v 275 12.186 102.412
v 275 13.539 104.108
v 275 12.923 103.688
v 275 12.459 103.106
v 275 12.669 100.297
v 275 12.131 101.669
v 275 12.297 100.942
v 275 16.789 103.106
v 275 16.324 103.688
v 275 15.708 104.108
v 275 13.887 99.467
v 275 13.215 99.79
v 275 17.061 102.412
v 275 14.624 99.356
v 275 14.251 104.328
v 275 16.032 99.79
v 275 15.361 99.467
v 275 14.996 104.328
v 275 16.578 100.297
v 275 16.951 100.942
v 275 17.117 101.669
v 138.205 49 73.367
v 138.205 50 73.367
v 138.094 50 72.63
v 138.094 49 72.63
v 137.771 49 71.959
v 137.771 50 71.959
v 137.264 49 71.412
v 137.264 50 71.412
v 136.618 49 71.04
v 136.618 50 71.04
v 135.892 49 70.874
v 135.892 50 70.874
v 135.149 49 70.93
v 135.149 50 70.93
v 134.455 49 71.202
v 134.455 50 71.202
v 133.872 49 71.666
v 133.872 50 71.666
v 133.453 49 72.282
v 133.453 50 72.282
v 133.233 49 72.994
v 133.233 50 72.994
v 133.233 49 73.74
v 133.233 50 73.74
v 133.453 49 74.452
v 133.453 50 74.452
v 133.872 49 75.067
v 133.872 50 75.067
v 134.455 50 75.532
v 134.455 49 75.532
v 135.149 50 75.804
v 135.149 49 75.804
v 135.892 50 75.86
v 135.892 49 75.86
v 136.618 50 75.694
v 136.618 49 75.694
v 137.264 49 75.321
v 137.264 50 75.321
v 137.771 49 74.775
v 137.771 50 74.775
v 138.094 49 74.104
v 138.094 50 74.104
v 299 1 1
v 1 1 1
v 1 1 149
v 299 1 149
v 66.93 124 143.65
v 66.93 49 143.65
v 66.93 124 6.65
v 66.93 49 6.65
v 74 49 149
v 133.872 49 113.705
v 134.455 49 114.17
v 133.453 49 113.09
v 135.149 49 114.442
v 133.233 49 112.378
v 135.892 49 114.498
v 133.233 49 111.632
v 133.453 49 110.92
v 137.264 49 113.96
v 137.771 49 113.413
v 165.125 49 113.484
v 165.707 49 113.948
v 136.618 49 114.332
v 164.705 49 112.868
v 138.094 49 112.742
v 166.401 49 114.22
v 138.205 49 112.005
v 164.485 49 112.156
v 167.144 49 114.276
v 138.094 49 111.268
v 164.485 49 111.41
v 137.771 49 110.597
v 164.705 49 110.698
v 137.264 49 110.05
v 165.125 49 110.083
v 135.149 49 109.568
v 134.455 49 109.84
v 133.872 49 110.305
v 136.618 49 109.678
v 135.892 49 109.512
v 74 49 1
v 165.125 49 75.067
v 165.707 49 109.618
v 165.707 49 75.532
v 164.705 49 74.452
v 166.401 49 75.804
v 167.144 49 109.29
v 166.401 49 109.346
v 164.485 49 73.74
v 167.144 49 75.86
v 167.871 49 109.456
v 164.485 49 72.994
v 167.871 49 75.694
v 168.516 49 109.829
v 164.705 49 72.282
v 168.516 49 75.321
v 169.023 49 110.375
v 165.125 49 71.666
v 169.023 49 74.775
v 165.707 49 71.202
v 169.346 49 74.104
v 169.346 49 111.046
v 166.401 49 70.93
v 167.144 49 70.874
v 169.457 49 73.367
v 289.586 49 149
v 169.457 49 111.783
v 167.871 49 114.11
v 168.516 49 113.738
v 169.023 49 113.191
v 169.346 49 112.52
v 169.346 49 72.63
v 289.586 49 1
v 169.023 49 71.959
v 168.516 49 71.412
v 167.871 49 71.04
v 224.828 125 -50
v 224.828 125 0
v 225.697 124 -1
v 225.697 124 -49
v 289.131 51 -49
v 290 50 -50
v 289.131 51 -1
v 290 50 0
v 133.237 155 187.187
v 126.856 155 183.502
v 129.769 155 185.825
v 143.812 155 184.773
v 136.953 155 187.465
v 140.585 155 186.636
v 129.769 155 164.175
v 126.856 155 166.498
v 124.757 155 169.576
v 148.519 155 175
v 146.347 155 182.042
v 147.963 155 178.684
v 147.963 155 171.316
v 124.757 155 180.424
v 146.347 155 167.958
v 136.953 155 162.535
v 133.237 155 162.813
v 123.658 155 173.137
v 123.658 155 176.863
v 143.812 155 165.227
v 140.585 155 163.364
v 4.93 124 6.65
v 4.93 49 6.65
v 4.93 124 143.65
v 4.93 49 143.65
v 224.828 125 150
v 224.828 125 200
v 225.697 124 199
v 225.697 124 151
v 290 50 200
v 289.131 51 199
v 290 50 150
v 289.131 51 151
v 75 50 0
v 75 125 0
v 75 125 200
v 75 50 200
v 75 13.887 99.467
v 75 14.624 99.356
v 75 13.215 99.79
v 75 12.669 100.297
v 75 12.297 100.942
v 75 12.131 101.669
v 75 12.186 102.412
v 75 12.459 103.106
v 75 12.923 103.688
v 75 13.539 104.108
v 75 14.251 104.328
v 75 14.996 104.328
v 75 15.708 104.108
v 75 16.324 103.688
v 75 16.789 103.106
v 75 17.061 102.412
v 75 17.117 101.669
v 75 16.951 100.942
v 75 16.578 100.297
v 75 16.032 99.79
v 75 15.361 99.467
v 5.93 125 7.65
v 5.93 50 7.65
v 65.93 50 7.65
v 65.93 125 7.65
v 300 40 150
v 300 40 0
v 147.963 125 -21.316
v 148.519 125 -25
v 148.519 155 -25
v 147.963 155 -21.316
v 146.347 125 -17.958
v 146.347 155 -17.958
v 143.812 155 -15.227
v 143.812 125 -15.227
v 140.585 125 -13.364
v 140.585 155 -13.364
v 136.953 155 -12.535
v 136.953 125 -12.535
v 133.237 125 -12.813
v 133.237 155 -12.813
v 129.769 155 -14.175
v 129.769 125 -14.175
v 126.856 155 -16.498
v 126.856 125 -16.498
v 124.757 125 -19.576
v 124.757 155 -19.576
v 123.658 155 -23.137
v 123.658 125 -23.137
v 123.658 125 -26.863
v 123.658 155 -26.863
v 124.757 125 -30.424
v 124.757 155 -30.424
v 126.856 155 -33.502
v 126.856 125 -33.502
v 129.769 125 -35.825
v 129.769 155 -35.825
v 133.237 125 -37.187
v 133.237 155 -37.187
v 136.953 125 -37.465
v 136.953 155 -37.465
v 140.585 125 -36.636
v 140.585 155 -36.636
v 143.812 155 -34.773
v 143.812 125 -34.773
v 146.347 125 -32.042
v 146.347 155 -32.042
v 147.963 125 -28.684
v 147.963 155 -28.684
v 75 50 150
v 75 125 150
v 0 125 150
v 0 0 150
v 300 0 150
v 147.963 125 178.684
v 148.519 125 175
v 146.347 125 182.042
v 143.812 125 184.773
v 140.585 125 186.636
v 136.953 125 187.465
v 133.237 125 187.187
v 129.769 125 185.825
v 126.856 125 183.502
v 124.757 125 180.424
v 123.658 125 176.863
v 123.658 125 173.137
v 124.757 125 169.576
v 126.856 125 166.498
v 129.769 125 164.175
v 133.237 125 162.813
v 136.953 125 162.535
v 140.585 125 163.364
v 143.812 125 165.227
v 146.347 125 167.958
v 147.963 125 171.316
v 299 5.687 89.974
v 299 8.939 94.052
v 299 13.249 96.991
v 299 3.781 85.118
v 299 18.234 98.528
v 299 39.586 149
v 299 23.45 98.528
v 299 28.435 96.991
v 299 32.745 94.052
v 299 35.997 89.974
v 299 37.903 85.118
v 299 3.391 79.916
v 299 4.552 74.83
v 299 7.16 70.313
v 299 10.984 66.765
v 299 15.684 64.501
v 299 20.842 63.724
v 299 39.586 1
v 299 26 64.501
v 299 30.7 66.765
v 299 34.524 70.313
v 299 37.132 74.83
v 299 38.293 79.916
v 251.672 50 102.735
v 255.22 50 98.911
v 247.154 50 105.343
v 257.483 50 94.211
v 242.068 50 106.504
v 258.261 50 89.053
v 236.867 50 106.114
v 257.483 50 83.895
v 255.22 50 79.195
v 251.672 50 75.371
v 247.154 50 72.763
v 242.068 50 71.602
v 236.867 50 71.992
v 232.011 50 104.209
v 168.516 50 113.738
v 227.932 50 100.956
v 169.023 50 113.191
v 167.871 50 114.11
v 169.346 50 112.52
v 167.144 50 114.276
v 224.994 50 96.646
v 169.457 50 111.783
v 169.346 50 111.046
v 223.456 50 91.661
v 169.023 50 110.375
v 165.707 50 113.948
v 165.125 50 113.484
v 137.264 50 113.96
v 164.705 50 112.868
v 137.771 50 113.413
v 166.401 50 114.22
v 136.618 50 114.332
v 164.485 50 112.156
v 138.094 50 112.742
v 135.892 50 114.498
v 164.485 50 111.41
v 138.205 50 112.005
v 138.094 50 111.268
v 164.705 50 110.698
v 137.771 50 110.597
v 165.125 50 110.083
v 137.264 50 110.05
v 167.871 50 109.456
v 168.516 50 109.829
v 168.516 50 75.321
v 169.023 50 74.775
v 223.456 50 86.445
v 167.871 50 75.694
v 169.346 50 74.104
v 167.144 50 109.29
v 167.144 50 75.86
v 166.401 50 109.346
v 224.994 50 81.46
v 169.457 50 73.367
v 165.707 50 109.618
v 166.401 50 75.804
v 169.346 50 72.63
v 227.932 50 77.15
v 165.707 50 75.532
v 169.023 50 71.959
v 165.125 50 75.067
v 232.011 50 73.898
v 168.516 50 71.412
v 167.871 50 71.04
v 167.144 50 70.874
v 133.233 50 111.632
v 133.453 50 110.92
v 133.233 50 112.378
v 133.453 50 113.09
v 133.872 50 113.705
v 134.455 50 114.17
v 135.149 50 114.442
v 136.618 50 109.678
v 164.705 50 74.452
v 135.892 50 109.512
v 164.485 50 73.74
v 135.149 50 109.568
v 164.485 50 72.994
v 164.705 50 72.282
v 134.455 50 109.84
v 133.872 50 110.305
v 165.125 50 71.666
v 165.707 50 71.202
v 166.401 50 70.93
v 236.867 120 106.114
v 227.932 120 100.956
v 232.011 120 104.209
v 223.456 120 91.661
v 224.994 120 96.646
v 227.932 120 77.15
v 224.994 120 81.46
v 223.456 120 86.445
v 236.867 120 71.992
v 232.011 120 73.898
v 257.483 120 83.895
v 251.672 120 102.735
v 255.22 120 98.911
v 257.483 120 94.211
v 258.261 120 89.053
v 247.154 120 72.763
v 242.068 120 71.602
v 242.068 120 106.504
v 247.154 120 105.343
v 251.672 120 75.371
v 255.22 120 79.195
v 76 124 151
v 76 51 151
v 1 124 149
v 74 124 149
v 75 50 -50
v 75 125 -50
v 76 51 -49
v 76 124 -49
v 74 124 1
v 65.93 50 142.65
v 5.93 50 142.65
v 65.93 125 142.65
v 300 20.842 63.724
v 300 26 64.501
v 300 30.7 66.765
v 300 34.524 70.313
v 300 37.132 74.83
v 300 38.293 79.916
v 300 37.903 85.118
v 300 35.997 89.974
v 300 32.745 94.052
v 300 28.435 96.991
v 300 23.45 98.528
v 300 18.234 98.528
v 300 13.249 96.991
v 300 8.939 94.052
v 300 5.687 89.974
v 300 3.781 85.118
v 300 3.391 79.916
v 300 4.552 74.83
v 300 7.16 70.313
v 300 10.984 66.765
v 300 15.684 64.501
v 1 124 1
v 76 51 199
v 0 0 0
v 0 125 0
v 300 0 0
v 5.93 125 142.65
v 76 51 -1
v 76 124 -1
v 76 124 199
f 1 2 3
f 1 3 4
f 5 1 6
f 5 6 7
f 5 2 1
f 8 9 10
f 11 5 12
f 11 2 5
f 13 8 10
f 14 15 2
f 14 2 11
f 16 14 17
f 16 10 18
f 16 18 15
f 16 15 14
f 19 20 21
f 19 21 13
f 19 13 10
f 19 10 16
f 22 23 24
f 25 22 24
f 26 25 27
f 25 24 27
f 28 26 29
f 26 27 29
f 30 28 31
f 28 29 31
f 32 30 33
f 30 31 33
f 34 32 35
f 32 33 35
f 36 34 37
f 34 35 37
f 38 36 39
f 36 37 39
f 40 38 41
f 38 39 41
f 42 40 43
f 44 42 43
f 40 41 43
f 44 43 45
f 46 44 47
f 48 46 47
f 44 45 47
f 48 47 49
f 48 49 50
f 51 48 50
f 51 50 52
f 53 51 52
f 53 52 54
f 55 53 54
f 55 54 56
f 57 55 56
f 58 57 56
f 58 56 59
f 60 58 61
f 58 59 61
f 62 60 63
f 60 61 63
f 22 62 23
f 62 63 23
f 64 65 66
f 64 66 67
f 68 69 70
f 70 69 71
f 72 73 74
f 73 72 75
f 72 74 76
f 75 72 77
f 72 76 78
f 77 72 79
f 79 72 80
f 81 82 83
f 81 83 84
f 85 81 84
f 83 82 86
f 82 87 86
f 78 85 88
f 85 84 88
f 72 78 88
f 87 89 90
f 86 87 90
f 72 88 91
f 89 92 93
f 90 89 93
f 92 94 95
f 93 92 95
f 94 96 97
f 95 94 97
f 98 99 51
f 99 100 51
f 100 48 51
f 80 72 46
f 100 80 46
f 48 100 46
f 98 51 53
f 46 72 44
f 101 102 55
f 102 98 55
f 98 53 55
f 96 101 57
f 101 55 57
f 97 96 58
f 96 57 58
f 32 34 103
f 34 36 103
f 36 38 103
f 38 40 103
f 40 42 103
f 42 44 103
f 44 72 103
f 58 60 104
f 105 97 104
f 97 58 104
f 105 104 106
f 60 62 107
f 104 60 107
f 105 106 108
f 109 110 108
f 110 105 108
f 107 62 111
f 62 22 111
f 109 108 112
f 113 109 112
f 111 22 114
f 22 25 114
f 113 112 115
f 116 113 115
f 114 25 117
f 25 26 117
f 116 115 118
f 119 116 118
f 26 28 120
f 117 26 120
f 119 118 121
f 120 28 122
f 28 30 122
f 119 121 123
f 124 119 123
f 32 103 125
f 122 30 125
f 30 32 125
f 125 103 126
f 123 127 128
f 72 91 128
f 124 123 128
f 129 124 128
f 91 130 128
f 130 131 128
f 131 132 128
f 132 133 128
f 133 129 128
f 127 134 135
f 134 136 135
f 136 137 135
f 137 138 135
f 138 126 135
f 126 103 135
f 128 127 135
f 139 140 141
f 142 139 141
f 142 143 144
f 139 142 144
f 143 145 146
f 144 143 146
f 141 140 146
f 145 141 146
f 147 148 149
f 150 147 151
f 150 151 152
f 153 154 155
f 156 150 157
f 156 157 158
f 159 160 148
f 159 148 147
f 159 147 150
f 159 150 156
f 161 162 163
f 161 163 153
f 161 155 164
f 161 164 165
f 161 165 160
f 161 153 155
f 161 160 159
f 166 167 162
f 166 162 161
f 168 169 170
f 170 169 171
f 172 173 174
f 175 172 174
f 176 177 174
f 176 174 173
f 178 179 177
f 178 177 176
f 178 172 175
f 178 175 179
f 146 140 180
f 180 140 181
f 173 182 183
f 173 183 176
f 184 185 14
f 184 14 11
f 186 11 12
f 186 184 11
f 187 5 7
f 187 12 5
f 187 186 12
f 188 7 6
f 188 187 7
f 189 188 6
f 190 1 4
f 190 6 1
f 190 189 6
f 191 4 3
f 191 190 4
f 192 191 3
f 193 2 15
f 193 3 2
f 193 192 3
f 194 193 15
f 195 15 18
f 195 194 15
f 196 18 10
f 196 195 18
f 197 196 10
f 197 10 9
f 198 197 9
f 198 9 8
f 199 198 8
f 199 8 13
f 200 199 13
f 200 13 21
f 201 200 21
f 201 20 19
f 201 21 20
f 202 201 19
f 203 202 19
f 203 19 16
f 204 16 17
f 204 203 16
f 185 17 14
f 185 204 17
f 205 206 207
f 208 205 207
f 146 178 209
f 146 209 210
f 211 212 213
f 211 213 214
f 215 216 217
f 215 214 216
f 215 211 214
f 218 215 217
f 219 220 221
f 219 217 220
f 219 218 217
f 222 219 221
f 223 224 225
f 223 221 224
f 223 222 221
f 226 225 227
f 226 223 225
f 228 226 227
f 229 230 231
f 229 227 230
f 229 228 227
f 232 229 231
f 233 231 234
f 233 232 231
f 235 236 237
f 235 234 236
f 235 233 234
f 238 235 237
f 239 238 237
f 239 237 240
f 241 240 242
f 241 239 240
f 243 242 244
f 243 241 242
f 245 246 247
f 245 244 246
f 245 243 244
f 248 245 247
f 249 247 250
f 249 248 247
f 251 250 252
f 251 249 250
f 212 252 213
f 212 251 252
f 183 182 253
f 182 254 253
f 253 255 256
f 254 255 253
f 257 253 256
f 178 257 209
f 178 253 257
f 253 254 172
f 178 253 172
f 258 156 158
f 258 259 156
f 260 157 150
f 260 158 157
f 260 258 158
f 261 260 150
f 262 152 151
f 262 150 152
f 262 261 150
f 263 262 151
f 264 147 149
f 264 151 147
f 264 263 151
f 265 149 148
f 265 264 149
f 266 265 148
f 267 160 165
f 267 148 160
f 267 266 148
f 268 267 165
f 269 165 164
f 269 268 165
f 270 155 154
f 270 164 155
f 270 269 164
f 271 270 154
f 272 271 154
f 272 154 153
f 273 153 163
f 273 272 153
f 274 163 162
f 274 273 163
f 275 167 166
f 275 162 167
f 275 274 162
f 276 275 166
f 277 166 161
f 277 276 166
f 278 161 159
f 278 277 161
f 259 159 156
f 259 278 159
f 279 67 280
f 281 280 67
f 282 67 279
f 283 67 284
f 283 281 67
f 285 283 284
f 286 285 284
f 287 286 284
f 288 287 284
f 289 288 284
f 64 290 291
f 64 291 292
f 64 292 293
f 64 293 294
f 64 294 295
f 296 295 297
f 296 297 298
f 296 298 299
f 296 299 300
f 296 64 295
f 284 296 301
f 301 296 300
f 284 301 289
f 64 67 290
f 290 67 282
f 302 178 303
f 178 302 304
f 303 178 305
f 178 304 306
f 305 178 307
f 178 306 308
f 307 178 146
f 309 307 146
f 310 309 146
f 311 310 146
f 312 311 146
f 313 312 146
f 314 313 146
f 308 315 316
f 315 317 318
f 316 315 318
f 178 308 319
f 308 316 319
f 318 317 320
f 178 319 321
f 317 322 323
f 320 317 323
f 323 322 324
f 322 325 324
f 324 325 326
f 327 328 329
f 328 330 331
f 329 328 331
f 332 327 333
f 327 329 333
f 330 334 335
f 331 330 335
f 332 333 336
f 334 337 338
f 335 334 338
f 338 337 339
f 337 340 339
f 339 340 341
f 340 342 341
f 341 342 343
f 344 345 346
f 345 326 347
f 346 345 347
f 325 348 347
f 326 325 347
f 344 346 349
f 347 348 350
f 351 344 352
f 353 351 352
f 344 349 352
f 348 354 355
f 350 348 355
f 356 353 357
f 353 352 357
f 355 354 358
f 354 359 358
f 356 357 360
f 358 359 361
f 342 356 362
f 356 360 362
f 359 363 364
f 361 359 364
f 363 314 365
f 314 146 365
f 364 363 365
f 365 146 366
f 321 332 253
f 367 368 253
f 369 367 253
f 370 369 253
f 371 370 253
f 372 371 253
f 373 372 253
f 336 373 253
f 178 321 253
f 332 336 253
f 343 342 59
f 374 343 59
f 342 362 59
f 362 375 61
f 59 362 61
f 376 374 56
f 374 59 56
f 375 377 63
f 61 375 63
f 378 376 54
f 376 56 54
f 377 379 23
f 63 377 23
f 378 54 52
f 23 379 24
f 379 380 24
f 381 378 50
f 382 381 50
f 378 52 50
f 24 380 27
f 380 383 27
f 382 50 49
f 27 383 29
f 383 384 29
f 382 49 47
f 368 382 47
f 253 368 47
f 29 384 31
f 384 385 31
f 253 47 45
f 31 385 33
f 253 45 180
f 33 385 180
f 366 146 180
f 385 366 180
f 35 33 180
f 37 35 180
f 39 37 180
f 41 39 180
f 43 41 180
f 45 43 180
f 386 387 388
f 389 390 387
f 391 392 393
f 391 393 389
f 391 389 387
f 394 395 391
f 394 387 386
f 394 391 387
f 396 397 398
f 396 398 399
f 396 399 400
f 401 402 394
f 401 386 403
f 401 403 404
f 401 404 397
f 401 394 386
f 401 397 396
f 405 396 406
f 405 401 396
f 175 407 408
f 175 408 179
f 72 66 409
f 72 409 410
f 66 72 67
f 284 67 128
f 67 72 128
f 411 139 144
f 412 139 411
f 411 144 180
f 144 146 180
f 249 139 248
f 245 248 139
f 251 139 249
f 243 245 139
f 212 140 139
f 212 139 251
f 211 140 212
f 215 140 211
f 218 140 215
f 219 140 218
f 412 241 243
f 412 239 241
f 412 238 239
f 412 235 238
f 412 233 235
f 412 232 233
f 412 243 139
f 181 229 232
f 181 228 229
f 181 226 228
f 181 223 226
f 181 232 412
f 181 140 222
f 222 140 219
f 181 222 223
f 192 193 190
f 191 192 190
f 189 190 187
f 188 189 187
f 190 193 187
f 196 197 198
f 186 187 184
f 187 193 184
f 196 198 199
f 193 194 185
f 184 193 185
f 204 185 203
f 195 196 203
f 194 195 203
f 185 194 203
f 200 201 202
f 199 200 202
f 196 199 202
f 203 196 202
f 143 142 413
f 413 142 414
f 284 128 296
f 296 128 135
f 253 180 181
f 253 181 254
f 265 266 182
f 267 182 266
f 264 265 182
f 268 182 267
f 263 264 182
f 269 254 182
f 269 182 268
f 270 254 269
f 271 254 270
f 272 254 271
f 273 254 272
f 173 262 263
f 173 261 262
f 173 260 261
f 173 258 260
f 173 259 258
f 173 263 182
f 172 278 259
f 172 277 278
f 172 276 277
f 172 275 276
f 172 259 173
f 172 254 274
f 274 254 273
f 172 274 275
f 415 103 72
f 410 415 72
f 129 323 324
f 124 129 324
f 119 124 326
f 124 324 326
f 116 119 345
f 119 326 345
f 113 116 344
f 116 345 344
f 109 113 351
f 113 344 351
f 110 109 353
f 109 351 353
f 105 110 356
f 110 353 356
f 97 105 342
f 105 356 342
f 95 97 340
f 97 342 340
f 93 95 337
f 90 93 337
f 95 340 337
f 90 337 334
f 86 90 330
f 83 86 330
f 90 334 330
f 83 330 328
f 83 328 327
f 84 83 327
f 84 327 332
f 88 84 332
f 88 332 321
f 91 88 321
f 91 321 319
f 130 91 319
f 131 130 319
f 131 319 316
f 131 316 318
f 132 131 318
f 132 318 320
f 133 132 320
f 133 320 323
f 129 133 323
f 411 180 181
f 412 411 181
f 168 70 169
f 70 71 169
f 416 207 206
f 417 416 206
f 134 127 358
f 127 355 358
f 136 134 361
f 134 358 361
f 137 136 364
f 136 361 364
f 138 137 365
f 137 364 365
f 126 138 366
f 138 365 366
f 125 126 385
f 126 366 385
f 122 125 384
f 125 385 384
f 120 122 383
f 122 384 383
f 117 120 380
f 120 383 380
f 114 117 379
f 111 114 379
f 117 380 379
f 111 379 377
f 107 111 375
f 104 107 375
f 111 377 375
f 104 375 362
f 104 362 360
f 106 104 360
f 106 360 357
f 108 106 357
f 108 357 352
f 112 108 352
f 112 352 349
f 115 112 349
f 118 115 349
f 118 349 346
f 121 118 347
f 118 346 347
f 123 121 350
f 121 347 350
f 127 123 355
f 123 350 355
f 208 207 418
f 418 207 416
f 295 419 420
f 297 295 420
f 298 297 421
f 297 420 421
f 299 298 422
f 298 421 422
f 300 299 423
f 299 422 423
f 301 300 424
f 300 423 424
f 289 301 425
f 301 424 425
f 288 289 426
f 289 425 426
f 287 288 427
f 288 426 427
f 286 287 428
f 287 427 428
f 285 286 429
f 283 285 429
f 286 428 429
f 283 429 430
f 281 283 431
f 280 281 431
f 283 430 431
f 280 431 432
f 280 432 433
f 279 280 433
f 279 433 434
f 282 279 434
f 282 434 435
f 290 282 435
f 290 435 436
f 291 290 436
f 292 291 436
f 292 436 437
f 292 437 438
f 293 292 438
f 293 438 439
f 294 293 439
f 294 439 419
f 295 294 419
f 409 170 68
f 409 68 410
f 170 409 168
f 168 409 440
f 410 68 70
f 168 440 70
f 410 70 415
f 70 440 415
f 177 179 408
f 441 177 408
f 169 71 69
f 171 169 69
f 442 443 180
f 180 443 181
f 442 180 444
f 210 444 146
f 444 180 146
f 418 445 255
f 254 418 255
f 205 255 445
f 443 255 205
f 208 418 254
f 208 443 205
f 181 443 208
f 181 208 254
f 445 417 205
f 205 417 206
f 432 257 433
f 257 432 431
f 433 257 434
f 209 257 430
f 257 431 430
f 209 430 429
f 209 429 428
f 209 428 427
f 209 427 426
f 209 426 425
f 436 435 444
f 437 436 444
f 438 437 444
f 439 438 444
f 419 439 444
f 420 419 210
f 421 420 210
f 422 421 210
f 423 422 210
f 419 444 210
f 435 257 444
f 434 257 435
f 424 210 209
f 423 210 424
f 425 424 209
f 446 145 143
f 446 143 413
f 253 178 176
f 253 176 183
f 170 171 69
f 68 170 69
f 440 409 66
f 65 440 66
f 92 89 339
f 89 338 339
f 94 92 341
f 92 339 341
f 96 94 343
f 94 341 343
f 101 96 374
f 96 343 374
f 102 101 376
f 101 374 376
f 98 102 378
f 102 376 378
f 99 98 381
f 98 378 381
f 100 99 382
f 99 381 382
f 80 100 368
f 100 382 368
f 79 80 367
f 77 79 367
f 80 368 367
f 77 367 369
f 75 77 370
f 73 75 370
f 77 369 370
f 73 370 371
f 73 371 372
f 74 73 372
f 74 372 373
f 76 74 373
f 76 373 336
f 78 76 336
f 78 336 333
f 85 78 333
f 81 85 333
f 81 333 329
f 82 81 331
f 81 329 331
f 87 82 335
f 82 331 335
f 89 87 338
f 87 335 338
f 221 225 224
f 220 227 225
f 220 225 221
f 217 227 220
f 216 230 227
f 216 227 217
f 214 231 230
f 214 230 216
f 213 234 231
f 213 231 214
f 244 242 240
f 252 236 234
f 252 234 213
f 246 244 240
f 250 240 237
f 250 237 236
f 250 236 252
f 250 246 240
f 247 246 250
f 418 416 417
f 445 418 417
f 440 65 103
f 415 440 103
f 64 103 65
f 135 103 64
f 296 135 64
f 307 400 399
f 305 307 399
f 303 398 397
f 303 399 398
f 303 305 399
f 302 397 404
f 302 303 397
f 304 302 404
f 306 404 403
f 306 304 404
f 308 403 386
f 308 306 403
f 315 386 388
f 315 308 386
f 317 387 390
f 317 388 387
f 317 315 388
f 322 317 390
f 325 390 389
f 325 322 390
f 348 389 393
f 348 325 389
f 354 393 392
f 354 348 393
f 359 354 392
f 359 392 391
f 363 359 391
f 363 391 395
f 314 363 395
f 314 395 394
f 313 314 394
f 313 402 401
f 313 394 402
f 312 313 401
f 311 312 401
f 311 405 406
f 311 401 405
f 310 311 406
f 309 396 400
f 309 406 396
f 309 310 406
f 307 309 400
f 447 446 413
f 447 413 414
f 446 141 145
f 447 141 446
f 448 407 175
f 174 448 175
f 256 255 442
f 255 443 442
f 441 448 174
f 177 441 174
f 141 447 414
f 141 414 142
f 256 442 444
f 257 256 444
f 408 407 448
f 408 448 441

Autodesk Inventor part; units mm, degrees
ref_plane "YZ Plane" through (0, 0, 0) normal (1, 0, 0) x (0, 1, 0)
ref_plane "XZ Plane" through (0, 0, 0) normal (0, 1, 0) x (-1, 0, 0)
sketch "Sketch1" plane through (0, 0, 0) normal (0, 0, 1) x (1, 0, 0)
  line L0 (0, 0) -> (300, 0)
  line L1 (300, 0) -> (300, 50)
  line L2 (300, 50) -> (0, 50)
  line L3 (0, 50) -> (0, 0)
  dimension "d0" = 300
  dimension "d1" = 50
extrude "Extrusion1" add sketch "Sketch1" along normal blind 150
sketch "Sketch2" plane through (0, 50, 0) normal (0, 1, 0) x (1, 0, 0)
  line L0 (0, 0) -> (0, -150) projected
  line L1 (300, -150) -> (0, -150) projected
  line L2 (0, 0) -> (75, 0)
  line L3 (75, 0) -> (75, -150)
  line L4 (75, -150) -> (0, -150)
  line L5 (0, -150) -> (0, 0)
  line L6 (5.9297, -7.65) -> (65.9297, -7.65)
  line L7 (65.9297, -7.65) -> (65.9297, -142.65)
  line L8 (65.9297, -142.65) -> (5.9297, -142.65)
  line L9 (5.9297, -142.65) -> (5.9297, -7.65)
  dimension "d4" = 75
  dimension "d5" = 60
  dimension "d6" = 135
  dimension "d7" = 7.35
extrude "Extrusion2" add sketch "Sketch2" along normal blind 75
sketch "Sketch3" plane through (300, 50, 150) normal (0, 1, 0) x (1, 0, 0)
  point P0 (-300, 150)
chamfer "Chamfer1" distance 10 angle 45 1 edges at (300, 50, 75)
sketch "Sketch5" plane through (75, 50, 150) normal (1, 0, 0) x (0, 0, -1)
  point P0 (150, -50)
sketch "Sketch6" plane through (0, 0, 150) normal (0, 0, 1) x (1, 0, 0)
  line L0 (75, 125) -> (224.8279, 125)
  line L1 (290, 50) -> (75, 50) projected
  line L2 (224.8279, 125) -> (290, 50)
  line L3 (75, 125) -> (75, 50)
  line L4 (290, 50) -> (75, 50) projected
  line L5 (75, 50) -> (290, 50)
  point P0 (0, 0)
extrude "Extrusion4" add sketch "Sketch6" along normal blind 50
sketch "Sketch7" plane through (0, 0, 150) normal (0, 0, -1) x (-1, 0, 0)
  point P0 (0, 0)
sketch "Sketch8" plane through (0, 0, 0) normal (0, 0, -1) x (-1, 0, 0)
  line L0 (-224.8279, 125) -> (-75, 125) projected
  line L1 (-75, 125) -> (-224.8279, 125)
  line L2 (-290, 50) -> (-300, 40) projected
  line L3 (-224.8279, 125) -> (-290, 50)
  line L4 (-290, 50) -> (-75, 50)
  line L5 (0, 125) -> (-75, 125) projected
  line L6 (-75, 50) -> (-75, 125)
  point P0 (0, 0)
extrude "Extrusion5" add sketch "Sketch8" along normal blind 50
shell "Shell1" thickness 1 removed faces 2 at (268.276, 75, 183.3333) at (246.5519, 100, -33.3333)
sketch "Sketch9" plane through (75, 125, 150) normal (0, 1, 0) x (1, 0, 0)
  circle A0 centre (61.0187, -25) radius 12.5
  circle A1 centre (61.0187, 175) radius 12.5
  circle A2 centre (61.0187, -29.8112) radius 0.5
  circle A3 centre (61.0187, -24.9762) radius 0.5
  point P0 (-75, 150)
  dimension "d22" = 25
  dimension "d23" = 25
  dimension "d32" = 1
  dimension "d33" = 1
  dimension "d34" = 4.835
extrude "Extrusion6" add sketch "Sketch9" along normal blind 30 contours A0 | A1 | A2 | A3
sketch "Sketch10" plane through (75, 50, 150) normal (0, 1, 0) x (1, 0, 0)
  circle A0 centre (165.7607, 60.9468) radius 17.5
  point P0 (-75, 150)
  dimension "d26" = 35
extrude "Extrusion7" add sketch "Sketch10" along normal blind 70
sketch "Sketch11" plane through (300, 0, 150) normal (1, 0, 0) x (0, 0, -1)
  point P0 (150, 0)
sketch "Sketch12" plane through (300, 0, 150) normal (1, 0, 0) x (0, 0, -1)
  point P0 (150, 0)
sketch "Sketch13" plane through (300, 0, 150) normal (1, 0, 0) x (0, 0, -1)
  circle A0 centre (68.7762, 20.842) radius 17.5
  point P0 (150, 0)
  dimension "d29" = 35
extrude "Extrusion8" cut sketch "Sketch13" against normal blind 5
sketch "Sketch14" plane through (136.0187, 155, 175) normal (0, 1, 0) x (1, 0, 0)
  point P0 (-136.0187, 175)
sketch "Sketch15" plane through (300, 0, 150) normal (1, 0, 0) x (0, 0, -1)
  point P0 (150, 0)
sketch "Sketch16" plane through (75, 50, 150) normal (1, 0, 0) x (0, 0, -1)
  circle A0 centre (48.1445, -35.3763) radius 2.5
  point P0 (150, -50)
  dimension "d35" = 5
extrude "Extrusion9" add sketch "Sketch16" along normal blind 200
ref_plane "Work Plane1" through (171.5, 50, 150) normal (1, 0, 0) x (0, 0, -1)
sketch "Sketch18" plane through (75, 50, 150) normal (0, 1, 0) x (1, 0, 0)
  line L0 (0, 50.6445) -> (200, 50.6445) projected
  circle A0 centre (60.705, 37.995) radius 2.5
  circle A1 centre (60.705, 76.6331) radius 2.5
  circle A2 centre (91.9572, 38.2169) radius 2.5
  circle A3 centre (91.9572, 76.6331) radius 2.5
  point P0 (-75, 150)
  dimension "d44" = 5
  dimension "d45" = 5
extrude "Extrusion11" cut sketch "Sketch18" against normal blind 10
sketch "Sketch19" plane through (75, 50, 150) normal (0, 1, 0) x (1, 0, 0)
  point P0 (-75, 150)
sketch "Sketch20" plane through (75, 50, 150) normal (0, 1, 0) x (1, 0, 0)
  point P0 (-75, 150)
properties material "Acetal Resin, White"
